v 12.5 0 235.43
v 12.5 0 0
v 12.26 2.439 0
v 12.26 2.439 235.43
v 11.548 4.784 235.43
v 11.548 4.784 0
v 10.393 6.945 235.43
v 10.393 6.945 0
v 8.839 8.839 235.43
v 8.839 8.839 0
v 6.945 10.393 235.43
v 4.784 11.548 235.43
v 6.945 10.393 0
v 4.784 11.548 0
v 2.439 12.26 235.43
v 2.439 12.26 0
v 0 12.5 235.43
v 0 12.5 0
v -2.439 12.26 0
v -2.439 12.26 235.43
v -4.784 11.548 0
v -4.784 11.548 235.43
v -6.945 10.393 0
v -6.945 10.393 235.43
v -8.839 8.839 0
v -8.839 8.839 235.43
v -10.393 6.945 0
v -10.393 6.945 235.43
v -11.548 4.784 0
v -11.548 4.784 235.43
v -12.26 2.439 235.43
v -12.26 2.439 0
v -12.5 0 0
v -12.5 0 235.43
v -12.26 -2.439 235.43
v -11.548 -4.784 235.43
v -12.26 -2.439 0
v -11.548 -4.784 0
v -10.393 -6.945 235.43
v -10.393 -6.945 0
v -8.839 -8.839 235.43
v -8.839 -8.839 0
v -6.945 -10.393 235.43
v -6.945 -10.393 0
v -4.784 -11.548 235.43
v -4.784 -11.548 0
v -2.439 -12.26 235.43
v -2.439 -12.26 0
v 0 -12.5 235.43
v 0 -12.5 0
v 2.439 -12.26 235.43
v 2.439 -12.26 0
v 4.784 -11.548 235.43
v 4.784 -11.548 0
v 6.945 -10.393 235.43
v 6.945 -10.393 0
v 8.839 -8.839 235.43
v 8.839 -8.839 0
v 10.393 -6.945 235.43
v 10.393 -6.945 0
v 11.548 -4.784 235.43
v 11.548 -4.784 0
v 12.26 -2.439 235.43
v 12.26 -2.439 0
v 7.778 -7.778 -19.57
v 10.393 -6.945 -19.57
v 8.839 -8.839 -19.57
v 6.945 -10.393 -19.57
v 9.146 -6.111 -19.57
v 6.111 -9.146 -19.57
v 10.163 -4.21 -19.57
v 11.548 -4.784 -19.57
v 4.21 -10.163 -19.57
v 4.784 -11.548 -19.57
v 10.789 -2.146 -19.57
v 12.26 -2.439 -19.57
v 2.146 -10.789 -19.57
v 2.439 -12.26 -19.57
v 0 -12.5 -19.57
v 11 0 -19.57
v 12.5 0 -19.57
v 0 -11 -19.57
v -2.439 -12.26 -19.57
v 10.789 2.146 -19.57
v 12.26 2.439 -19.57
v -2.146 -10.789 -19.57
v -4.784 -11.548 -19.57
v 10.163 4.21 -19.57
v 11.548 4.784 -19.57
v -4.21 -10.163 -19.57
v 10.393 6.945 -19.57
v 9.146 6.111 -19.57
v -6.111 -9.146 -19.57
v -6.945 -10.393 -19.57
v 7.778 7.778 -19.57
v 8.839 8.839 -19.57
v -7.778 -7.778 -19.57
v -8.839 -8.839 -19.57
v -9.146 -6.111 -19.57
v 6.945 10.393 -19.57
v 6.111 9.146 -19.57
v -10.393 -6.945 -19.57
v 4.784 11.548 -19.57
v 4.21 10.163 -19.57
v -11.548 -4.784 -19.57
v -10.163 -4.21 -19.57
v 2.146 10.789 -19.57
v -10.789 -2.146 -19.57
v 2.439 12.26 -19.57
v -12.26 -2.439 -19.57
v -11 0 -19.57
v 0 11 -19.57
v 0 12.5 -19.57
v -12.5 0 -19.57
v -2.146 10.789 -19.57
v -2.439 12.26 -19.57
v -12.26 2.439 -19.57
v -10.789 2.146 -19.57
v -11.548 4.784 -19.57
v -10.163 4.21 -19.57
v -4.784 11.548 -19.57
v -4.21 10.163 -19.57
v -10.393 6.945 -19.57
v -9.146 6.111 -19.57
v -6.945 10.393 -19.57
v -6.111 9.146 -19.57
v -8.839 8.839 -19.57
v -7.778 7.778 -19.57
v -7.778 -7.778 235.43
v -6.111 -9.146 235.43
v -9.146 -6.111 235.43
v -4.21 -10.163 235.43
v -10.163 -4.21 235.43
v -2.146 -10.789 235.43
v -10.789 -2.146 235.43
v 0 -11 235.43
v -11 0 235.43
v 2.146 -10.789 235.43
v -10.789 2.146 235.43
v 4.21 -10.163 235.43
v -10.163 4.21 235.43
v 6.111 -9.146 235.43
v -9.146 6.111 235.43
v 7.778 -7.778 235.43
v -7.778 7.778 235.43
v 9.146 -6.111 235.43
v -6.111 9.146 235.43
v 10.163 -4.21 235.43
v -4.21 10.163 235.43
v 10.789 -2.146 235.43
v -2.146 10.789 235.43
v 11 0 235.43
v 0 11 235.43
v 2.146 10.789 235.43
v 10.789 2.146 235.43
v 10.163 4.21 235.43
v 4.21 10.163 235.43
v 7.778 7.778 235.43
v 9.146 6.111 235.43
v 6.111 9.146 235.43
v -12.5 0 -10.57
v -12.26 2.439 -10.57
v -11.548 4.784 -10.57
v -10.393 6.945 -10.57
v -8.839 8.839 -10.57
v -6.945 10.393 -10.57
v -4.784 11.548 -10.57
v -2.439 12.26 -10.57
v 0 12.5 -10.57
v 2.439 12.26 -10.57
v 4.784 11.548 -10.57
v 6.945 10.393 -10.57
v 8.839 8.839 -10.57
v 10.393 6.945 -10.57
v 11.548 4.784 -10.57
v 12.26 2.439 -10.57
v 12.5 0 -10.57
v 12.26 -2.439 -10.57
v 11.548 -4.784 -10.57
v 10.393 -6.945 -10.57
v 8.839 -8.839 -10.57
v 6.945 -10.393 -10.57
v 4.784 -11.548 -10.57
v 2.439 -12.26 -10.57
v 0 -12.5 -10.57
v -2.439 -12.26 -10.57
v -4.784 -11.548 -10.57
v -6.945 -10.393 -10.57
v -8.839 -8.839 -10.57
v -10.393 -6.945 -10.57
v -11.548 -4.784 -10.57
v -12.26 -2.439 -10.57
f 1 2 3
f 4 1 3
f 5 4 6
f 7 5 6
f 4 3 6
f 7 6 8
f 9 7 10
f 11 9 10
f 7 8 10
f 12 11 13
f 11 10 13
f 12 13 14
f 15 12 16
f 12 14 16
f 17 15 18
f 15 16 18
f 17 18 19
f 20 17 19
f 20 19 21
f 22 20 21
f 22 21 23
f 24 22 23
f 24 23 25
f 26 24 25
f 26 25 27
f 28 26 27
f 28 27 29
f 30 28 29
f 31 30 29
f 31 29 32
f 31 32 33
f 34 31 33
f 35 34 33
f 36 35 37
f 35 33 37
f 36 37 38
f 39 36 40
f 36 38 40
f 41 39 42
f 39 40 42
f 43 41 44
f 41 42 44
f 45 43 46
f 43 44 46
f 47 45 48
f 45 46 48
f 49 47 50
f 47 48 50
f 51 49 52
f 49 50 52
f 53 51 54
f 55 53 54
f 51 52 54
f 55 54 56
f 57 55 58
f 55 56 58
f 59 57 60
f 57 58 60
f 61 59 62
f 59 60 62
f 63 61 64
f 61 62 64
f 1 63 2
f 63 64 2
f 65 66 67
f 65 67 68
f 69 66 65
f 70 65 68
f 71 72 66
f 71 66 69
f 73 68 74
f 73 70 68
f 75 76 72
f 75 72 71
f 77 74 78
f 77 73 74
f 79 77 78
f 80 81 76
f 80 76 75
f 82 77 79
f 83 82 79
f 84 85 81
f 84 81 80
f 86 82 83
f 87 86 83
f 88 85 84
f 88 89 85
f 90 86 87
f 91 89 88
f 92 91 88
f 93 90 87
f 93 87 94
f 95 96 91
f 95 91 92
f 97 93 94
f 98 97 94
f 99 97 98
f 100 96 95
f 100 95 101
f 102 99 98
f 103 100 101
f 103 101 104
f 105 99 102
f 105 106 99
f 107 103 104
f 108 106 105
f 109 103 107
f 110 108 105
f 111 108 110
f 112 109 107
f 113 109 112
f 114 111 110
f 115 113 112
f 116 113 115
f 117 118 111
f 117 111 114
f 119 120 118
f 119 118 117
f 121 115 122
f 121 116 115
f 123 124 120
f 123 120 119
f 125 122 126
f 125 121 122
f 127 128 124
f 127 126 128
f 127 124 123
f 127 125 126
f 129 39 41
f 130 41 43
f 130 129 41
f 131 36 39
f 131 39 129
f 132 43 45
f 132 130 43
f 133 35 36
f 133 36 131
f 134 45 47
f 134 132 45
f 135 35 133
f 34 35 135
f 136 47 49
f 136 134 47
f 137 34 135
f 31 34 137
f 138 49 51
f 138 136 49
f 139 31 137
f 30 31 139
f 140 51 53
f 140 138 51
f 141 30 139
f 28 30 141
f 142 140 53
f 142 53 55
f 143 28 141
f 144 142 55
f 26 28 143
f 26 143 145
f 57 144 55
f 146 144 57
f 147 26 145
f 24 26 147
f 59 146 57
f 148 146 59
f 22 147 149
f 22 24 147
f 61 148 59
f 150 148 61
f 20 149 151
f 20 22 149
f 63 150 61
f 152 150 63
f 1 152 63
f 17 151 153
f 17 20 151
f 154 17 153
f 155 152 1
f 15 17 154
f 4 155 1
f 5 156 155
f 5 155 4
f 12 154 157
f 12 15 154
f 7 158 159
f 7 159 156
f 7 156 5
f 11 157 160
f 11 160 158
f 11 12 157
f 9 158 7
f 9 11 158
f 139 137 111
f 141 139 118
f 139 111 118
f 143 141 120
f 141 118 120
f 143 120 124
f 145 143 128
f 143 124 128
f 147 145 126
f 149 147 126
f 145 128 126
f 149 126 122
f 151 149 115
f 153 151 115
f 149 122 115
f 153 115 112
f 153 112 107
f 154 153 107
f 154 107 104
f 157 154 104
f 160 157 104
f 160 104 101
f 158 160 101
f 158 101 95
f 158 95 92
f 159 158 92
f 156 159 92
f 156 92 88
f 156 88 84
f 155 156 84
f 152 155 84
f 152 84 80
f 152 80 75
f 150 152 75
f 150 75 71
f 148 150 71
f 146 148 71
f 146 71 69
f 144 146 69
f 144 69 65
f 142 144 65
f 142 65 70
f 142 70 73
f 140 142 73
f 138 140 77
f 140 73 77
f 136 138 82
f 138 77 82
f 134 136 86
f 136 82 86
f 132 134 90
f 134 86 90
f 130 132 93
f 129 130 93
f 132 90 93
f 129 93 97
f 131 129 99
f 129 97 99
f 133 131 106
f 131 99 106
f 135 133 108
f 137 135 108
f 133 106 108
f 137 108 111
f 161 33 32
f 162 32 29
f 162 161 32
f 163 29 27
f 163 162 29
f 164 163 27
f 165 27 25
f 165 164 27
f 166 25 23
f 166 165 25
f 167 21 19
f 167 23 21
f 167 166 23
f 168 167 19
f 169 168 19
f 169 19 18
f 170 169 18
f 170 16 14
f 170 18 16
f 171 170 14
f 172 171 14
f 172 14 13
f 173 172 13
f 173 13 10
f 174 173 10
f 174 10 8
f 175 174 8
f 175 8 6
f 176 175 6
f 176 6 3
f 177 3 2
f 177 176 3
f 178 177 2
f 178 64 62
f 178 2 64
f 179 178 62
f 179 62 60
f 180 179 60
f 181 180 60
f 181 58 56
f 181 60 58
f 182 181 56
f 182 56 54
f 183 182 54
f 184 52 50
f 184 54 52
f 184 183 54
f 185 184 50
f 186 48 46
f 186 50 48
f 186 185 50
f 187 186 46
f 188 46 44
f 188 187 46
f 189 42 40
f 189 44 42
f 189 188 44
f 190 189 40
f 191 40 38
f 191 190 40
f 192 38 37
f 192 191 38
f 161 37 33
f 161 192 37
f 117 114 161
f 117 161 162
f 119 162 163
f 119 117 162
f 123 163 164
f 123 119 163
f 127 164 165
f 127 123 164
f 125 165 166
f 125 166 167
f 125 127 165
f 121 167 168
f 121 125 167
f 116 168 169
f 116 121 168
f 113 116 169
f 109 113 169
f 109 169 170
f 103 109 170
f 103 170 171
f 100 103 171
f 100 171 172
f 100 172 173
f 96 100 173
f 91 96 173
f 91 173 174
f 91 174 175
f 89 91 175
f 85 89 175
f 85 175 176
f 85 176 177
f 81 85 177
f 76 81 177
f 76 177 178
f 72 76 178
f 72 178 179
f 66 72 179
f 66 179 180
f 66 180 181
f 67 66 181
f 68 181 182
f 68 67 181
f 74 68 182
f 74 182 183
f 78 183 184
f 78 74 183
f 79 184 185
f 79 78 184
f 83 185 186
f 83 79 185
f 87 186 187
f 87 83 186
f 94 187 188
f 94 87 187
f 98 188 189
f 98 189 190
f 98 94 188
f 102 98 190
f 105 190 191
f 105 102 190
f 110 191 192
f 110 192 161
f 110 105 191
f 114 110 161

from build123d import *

# Parameters (mm, degrees)
SKETCH_1_R          = 12.5
EXTRUDE_2_DEPTH     = 235.43
SKETCH_2_R          = 9
CUT_EXTRUDE_1_DEPTH = 235.43
EXTRUDE_START       = 15.57
SKETCH_3_R          = 12.5
EXTRUDE_3_DEPTH     = 15.57
SKETCH_4_R          = 9
CUT_EXTRUDE_2_DEPTH = 20
EXTRUDE_START_2     = 9.93
SKETCH_5_R          = 12.5
EXTRUDE_4_DEPTH     = 9.93
SKETCH_6_R          = 9
CUT_EXTRUDE_3_DEPTH = 10
SKETCH_7_R          = 26.85848727
CUT_EXTRUDE_4_DEPTH = 14.93
SKETCH_8_R          = 12.5
EXTRUDE_5_DEPTH     = 9.93
SKETCH_9_R          = 9
CUT_EXTRUDE_5_DEPTH = 10
SKETCH_10_R         = 37.193394561
CUT_EXTRUDE_6_DEPTH = 0.22
SKETCH_11_R         = 43.187188263
CUT_EXTRUDE_7_DEPTH = 0.71
SKETCH_12_R         = 11
CUT_EXTRUDE_8_DEPTH = 338


with BuildPart() as part:
    # 草图1 → 凸台-拉伸2 (new body)
    with BuildSketch(Plane.XY):
        Circle(SKETCH_1_R)
    extrude(amount=EXTRUDE_2_DEPTH)

    # 草图2 → 切除-拉伸1 (cut)
    with BuildSketch(Plane(origin=(0, 0, 0), x_dir=(-1, 0, 0), z_dir=(0, 0, -1))):
        Circle(SKETCH_2_R)
    extrude(amount=-CUT_EXTRUDE_1_DEPTH, mode=Mode.SUBTRACT)

    # 草图3 → 凸台-拉伸3 (add)
    with BuildSketch(Plane(origin=(0, 0, 0), x_dir=(-1, 0, 0), z_dir=(0, 0, -1)).offset(EXTRUDE_START)):
        Circle(SKETCH_3_R)
    extrude(amount=-EXTRUDE_3_DEPTH)

    # 草图4 → 切除-拉伸2 (cut)
    with BuildSketch(Plane(origin=(0, 0, -15.57), x_dir=(-1, 0, 0), z_dir=(0, 0, -1))):
        Circle(SKETCH_4_R)
    extrude(amount=-CUT_EXTRUDE_2_DEPTH, mode=Mode.SUBTRACT)

    # 草图5 → 凸台-拉伸4 (add)
    with BuildSketch(Plane(origin=(0, 0, -15.57), x_dir=(-1, 0, 0), z_dir=(0, 0, -1)).offset(EXTRUDE_START_2)):
        Circle(SKETCH_5_R)
    extrude(amount=-EXTRUDE_4_DEPTH)

    # 草图6 → 切除-拉伸3 (cut)
    with BuildSketch(Plane(origin=(0, 0, -25.5), x_dir=(-1, 0, 0), z_dir=(0, 0, -1))):
        Circle(SKETCH_6_R)
    extrude(amount=-CUT_EXTRUDE_3_DEPTH, mode=Mode.SUBTRACT)

    # 草图7 → 切除-拉伸4 (cut)
    with BuildSketch(Plane(origin=(0, 0, -25.5), x_dir=(-1, 0, 0), z_dir=(0, 0, -1))):
        Circle(SKETCH_7_R)
    extrude(amount=-CUT_EXTRUDE_4_DEPTH, mode=Mode.SUBTRACT)

    # 草图8 → 凸台-拉伸5 (add)
    with BuildSketch(Plane(origin=(0, 0, -10.57), x_dir=(-1, 0, 0), z_dir=(0, 0, -1)).offset(EXTRUDE_START_2)):
        Circle(SKETCH_8_R)
    extrude(amount=-EXTRUDE_5_DEPTH)

    # 草图9 → 切除-拉伸5 (cut)
    with BuildSketch(Plane(origin=(0, 0, -20.5), x_dir=(-1, 0, 0), z_dir=(0, 0, -1))):
        Circle(SKETCH_9_R)
    extrude(amount=-CUT_EXTRUDE_5_DEPTH, mode=Mode.SUBTRACT)

    # 草图10 → 切除-拉伸6 (cut)
    with BuildSketch(Plane(origin=(0, 0, -20.5), x_dir=(-1, 0, 0), z_dir=(0, 0, -1))):
        with Locations((7.201744855, 7.507888779)):
            Circle(SKETCH_10_R)
    extrude(amount=-CUT_EXTRUDE_6_DEPTH, mode=Mode.SUBTRACT)

    # 草图11 → 切除-拉伸7 (cut)
    with BuildSketch(Plane(origin=(0, 0, -20.28), x_dir=(-1, 0, 0), z_dir=(0, 0, -1))):
        with Locations((-1.225460352, 2.329416421)):
            Circle(SKETCH_11_R)
    extrude(amount=-CUT_EXTRUDE_7_DEPTH, mode=Mode.SUBTRACT)

    # 草图12 → 切除-拉伸8 (cut)
    with BuildSketch(Plane(origin=(0, 0, -19.57), x_dir=(-1, 0, 0), z_dir=(0, 0, -1))):
        Circle(SKETCH_12_R)
    extrude(amount=-CUT_EXTRUDE_8_DEPTH, mode=Mode.SUBTRACT)


solid = part.part
